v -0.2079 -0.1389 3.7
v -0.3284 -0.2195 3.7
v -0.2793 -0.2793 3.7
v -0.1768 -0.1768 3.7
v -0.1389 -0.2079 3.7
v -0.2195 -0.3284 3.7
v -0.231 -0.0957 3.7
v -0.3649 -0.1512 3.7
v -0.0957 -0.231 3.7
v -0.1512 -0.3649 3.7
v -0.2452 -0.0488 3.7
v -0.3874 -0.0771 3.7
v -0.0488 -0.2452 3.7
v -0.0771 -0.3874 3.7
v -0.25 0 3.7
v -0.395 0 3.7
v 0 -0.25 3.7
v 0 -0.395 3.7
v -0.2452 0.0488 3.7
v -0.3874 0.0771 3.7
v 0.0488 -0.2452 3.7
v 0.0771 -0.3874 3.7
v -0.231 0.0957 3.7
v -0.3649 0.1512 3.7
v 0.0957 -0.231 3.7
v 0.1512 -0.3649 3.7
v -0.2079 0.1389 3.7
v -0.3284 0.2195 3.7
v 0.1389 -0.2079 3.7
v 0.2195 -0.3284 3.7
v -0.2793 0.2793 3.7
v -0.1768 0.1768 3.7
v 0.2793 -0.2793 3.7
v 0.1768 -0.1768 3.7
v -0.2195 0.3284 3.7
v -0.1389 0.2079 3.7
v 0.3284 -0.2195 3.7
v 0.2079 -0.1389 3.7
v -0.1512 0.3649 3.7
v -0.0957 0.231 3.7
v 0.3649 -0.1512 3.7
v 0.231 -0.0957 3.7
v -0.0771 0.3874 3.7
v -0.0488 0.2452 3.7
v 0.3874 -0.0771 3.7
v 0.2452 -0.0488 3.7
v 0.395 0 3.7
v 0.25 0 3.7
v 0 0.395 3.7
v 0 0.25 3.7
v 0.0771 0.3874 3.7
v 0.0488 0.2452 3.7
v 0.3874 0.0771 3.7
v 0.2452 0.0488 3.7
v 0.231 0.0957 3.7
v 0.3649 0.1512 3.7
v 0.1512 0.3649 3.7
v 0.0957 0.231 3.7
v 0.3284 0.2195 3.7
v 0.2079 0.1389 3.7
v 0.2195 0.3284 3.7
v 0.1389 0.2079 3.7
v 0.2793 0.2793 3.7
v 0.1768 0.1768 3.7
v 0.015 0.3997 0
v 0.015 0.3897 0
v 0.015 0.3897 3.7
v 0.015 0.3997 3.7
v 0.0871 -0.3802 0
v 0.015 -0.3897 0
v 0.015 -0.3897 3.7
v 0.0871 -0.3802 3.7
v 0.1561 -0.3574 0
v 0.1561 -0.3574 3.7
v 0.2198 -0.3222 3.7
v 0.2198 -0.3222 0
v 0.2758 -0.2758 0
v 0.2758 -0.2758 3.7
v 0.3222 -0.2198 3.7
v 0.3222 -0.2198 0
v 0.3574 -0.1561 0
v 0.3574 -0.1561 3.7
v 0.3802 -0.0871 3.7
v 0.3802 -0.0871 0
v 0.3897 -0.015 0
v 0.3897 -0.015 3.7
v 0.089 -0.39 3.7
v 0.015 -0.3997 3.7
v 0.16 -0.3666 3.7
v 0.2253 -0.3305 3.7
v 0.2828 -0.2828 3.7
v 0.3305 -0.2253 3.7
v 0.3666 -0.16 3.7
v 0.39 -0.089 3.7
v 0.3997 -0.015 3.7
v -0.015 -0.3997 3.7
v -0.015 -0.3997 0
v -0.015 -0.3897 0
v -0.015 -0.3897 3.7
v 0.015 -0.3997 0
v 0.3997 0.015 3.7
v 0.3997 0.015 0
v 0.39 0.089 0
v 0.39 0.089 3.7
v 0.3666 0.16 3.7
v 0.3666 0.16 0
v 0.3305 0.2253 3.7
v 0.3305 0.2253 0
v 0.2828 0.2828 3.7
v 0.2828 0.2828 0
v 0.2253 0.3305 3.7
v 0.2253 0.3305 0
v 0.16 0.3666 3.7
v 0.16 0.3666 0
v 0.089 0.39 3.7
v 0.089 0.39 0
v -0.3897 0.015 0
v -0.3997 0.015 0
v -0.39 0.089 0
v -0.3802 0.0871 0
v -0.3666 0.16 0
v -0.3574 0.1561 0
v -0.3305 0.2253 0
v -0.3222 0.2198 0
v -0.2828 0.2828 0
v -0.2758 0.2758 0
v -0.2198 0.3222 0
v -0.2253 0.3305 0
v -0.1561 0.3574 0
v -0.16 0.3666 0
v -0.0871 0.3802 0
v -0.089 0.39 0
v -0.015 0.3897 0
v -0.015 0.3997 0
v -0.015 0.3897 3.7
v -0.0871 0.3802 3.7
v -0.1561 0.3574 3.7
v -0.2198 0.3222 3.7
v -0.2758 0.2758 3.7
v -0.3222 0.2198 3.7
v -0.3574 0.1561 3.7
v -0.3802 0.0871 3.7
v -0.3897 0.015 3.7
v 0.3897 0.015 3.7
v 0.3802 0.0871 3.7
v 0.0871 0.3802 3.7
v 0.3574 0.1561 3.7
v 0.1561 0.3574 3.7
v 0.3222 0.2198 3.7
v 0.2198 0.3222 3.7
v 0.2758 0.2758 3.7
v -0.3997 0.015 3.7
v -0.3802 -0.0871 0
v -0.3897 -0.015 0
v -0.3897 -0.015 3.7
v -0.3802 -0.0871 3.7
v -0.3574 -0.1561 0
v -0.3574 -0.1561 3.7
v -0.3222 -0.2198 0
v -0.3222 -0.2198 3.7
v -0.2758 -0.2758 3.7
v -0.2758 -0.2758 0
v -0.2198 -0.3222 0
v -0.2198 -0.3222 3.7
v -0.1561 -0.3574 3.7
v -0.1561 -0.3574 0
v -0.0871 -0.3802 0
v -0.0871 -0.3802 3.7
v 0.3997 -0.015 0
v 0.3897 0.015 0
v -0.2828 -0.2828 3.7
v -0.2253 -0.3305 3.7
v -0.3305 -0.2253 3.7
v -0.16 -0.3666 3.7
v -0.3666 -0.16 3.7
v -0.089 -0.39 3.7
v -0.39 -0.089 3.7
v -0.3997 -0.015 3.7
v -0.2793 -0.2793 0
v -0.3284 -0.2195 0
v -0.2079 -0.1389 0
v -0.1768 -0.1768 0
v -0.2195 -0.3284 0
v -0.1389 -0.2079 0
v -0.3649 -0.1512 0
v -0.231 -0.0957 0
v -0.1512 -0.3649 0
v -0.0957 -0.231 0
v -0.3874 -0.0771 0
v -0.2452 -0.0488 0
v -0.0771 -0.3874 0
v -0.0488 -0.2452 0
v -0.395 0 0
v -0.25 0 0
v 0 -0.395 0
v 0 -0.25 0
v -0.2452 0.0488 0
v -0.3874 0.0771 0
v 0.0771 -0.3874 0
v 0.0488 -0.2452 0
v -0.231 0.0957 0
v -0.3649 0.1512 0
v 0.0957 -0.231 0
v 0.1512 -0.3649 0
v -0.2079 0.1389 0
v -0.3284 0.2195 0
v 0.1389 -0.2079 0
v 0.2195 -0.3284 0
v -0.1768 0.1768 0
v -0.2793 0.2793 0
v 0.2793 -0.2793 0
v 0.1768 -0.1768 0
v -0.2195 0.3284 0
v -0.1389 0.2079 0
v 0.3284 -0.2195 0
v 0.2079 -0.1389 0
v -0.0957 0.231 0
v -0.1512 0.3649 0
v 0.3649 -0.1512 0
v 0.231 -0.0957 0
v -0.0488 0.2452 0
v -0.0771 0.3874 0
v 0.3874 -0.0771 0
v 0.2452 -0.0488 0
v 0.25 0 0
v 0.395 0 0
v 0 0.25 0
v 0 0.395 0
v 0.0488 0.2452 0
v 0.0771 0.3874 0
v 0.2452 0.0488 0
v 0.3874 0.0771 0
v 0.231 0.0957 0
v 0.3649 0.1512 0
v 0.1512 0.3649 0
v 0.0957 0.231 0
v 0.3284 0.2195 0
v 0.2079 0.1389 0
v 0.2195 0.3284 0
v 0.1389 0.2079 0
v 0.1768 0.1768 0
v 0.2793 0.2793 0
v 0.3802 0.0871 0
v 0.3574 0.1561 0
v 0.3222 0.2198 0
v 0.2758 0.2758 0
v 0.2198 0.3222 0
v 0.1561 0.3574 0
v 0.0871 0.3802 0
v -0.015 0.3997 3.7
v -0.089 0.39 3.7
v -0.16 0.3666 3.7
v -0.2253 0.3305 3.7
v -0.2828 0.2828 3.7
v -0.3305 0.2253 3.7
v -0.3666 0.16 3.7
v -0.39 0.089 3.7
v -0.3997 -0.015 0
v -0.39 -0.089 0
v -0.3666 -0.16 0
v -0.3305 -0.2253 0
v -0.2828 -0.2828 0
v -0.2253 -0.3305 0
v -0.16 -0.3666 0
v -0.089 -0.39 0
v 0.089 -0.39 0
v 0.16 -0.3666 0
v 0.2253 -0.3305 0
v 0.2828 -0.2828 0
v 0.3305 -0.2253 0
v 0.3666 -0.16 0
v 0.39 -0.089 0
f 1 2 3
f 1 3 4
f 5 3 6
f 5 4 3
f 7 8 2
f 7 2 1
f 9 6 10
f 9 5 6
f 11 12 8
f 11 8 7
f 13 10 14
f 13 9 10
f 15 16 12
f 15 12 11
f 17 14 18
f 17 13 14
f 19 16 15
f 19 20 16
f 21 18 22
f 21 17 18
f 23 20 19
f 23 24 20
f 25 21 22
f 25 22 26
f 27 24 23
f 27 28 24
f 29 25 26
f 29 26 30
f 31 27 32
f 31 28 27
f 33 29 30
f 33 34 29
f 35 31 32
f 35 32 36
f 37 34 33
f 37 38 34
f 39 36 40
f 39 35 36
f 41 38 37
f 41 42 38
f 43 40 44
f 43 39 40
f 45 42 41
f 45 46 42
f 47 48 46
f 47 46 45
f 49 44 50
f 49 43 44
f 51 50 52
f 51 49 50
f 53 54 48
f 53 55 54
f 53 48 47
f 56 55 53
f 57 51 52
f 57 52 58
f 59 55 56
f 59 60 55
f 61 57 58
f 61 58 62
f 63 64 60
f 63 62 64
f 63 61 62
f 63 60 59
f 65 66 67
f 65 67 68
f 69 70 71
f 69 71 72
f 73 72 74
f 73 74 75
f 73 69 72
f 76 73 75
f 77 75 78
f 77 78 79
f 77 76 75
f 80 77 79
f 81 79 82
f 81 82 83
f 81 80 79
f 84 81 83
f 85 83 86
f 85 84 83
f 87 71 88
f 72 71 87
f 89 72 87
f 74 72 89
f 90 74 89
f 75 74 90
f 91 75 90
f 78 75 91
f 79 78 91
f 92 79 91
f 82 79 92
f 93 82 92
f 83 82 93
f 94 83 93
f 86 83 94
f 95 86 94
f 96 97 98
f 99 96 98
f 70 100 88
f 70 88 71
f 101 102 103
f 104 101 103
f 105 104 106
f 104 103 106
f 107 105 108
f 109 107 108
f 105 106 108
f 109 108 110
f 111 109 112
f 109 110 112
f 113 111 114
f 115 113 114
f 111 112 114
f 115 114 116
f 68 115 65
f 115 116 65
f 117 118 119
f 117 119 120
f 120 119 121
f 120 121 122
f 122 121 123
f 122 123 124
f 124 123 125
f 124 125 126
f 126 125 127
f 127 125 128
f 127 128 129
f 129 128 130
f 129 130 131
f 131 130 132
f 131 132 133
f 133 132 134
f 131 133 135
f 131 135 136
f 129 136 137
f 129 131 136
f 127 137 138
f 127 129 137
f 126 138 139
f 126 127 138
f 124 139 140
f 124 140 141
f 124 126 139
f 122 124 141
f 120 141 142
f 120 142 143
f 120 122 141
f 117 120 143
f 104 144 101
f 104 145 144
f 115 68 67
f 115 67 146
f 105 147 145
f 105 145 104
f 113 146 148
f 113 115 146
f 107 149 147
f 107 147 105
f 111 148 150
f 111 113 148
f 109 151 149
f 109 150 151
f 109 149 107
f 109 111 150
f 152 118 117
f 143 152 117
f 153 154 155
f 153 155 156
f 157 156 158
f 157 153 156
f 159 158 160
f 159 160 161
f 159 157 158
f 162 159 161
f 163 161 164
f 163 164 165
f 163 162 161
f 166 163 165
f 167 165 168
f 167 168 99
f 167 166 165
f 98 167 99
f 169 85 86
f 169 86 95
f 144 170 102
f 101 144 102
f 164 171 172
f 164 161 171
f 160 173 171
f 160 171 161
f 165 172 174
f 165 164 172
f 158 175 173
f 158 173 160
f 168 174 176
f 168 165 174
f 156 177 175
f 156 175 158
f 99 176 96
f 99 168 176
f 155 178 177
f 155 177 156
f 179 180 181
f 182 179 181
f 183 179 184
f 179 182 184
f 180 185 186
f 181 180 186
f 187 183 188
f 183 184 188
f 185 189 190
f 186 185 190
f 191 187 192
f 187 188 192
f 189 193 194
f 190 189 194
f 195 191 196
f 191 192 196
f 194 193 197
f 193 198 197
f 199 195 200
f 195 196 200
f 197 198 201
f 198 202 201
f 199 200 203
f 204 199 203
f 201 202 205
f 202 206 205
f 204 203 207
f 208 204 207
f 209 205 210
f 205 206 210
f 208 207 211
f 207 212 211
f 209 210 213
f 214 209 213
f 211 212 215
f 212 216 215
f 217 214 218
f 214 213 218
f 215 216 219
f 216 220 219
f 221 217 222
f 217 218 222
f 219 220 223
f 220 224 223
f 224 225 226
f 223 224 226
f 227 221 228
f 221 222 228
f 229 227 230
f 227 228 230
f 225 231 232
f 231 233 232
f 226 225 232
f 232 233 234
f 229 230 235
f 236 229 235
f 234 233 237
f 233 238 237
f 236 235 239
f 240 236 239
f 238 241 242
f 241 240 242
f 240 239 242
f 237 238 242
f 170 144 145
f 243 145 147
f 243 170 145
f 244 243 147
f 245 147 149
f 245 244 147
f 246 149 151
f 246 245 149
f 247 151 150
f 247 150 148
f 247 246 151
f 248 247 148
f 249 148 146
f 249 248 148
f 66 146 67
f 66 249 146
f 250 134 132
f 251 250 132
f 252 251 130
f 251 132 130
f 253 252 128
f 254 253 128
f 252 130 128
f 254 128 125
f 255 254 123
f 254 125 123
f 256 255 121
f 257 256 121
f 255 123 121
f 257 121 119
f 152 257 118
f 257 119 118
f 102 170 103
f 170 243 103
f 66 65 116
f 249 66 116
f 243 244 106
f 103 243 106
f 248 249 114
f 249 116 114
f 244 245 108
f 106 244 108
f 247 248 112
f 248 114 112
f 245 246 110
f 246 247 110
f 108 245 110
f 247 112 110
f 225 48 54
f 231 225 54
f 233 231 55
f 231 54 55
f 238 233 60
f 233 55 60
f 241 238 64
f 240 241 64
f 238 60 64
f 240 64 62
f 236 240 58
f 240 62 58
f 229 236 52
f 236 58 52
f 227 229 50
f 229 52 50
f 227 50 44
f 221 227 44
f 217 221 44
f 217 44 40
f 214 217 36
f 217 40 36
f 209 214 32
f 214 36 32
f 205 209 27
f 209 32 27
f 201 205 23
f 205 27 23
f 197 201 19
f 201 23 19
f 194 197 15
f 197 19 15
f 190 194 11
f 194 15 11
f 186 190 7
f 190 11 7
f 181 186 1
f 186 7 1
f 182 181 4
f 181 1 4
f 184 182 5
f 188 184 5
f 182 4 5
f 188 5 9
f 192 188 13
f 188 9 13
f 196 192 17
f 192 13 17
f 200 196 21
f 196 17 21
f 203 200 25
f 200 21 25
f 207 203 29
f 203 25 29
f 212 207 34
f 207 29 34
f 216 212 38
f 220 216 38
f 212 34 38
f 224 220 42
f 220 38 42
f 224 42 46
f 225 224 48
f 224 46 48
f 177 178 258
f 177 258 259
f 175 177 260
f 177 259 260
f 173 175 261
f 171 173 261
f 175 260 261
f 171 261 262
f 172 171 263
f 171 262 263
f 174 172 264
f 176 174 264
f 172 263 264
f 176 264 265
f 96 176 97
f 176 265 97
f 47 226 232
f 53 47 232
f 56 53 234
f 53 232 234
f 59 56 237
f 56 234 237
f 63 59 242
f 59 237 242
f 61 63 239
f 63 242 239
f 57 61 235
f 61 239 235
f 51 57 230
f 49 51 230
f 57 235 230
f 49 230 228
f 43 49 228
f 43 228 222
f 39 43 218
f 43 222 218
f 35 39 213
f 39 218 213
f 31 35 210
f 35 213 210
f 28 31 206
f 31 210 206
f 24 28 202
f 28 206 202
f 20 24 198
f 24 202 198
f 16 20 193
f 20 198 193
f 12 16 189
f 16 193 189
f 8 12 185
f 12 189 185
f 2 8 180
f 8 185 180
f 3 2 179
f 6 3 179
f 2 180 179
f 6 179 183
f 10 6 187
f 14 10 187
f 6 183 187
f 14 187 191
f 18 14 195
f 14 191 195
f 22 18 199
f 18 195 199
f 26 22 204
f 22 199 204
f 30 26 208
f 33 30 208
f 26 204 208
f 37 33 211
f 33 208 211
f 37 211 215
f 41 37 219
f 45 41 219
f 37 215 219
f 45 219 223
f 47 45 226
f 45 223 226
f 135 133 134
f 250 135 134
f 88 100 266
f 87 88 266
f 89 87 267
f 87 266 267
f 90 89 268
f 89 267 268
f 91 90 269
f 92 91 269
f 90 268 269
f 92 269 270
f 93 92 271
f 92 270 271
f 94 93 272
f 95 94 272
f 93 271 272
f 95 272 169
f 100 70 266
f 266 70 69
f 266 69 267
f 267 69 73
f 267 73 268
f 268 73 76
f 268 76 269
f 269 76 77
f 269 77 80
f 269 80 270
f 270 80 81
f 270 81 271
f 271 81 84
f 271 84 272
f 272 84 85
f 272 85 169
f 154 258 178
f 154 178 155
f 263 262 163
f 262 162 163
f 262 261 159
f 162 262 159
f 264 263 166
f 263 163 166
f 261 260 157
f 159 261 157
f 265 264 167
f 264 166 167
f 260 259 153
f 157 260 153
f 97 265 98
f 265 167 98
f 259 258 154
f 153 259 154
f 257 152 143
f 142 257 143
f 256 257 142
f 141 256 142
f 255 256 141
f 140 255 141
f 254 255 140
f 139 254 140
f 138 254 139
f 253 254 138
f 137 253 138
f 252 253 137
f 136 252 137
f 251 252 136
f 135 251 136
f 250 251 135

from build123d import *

# Parameters (mm, degrees)
SKETCH1_R                = 0.4
SKETCH1_R_2              = 0.39
EXTERNAL_ELECTRODE_DEPTH = 3.7
SKETCH3_W                = 0.03
SKETCH3_H                = 1
SKETCH3_W_2              = 1
SKETCH3_H_2              = 0.03
CUTS_DEPTH               = 3.7
SKETCH5_R                = 0.395
SKETCH5_R_2              = 0.255
PZT_TUBE_DEPTH           = 3.7
SKETCH7_R                = 0.255
SKETCH7_R_2              = 0.25
INTERNAL_ELECTRODE_DEPTH = 3.7


with BuildPart() as part:
    # Sketch1 → External Electrode (new body)
    with BuildSketch(Plane.XY):
        Circle(SKETCH1_R)
        Circle(SKETCH1_R_2, mode=Mode.SUBTRACT)
    extrude(amount=EXTERNAL_ELECTRODE_DEPTH)

    # Sketch3 → Cuts (cut)
    with BuildSketch(Plane.XY):
        Rectangle(SKETCH3_W, SKETCH3_H)
        Rectangle(SKETCH3_W_2, SKETCH3_H_2)
    extrude(amount=CUTS_DEPTH, mode=Mode.SUBTRACT)


with BuildPart() as cuts_piece_1:
    # of the separate pieces the step leaves, piece 1, a body of its own (cuts_pieces)
    add(part.part.solids().sort_by_distance((-0.015, 0.399718651, 0))[0])


with BuildPart() as cuts_piece_2:
    # of the separate pieces the step leaves, piece 2, a body of its own (cuts_pieces)
    add(part.part.solids().sort_by_distance((-0.399718651, -0.015, 0))[0])


with BuildPart() as cuts_piece_3:
    # of the separate pieces the step leaves, piece 3, a body of its own (cuts_pieces)
    add(part.part.solids().sort_by_distance((0.015, -0.399718651, 0))[0])


with BuildPart() as cuts_piece_4:
    # of the separate pieces the step leaves, piece 4, a body of its own (cuts_pieces)
    add(part.part.solids().sort_by_distance((0.399718651, 0.015, 0))[0])


with BuildPart() as body_5:
    # Sketch5 → PZT Tube (new body)
    with BuildSketch(Plane.XY):
        Circle(SKETCH5_R)
        Circle(SKETCH5_R_2, mode=Mode.SUBTRACT)
    extrude(amount=PZT_TUBE_DEPTH)

    # Sketch7 → Internal Electrode (add)
    with BuildSketch(Plane.XY.offset(3.7)):
        Circle(SKETCH7_R)
        Circle(SKETCH7_R_2, mode=Mode.SUBTRACT)
    extrude(amount=-INTERNAL_ELECTRODE_DEPTH)


solid = Compound([cuts_piece_1.part, cuts_piece_2.part, cuts_piece_3.part, cuts_piece_4.part, body_5.part])
